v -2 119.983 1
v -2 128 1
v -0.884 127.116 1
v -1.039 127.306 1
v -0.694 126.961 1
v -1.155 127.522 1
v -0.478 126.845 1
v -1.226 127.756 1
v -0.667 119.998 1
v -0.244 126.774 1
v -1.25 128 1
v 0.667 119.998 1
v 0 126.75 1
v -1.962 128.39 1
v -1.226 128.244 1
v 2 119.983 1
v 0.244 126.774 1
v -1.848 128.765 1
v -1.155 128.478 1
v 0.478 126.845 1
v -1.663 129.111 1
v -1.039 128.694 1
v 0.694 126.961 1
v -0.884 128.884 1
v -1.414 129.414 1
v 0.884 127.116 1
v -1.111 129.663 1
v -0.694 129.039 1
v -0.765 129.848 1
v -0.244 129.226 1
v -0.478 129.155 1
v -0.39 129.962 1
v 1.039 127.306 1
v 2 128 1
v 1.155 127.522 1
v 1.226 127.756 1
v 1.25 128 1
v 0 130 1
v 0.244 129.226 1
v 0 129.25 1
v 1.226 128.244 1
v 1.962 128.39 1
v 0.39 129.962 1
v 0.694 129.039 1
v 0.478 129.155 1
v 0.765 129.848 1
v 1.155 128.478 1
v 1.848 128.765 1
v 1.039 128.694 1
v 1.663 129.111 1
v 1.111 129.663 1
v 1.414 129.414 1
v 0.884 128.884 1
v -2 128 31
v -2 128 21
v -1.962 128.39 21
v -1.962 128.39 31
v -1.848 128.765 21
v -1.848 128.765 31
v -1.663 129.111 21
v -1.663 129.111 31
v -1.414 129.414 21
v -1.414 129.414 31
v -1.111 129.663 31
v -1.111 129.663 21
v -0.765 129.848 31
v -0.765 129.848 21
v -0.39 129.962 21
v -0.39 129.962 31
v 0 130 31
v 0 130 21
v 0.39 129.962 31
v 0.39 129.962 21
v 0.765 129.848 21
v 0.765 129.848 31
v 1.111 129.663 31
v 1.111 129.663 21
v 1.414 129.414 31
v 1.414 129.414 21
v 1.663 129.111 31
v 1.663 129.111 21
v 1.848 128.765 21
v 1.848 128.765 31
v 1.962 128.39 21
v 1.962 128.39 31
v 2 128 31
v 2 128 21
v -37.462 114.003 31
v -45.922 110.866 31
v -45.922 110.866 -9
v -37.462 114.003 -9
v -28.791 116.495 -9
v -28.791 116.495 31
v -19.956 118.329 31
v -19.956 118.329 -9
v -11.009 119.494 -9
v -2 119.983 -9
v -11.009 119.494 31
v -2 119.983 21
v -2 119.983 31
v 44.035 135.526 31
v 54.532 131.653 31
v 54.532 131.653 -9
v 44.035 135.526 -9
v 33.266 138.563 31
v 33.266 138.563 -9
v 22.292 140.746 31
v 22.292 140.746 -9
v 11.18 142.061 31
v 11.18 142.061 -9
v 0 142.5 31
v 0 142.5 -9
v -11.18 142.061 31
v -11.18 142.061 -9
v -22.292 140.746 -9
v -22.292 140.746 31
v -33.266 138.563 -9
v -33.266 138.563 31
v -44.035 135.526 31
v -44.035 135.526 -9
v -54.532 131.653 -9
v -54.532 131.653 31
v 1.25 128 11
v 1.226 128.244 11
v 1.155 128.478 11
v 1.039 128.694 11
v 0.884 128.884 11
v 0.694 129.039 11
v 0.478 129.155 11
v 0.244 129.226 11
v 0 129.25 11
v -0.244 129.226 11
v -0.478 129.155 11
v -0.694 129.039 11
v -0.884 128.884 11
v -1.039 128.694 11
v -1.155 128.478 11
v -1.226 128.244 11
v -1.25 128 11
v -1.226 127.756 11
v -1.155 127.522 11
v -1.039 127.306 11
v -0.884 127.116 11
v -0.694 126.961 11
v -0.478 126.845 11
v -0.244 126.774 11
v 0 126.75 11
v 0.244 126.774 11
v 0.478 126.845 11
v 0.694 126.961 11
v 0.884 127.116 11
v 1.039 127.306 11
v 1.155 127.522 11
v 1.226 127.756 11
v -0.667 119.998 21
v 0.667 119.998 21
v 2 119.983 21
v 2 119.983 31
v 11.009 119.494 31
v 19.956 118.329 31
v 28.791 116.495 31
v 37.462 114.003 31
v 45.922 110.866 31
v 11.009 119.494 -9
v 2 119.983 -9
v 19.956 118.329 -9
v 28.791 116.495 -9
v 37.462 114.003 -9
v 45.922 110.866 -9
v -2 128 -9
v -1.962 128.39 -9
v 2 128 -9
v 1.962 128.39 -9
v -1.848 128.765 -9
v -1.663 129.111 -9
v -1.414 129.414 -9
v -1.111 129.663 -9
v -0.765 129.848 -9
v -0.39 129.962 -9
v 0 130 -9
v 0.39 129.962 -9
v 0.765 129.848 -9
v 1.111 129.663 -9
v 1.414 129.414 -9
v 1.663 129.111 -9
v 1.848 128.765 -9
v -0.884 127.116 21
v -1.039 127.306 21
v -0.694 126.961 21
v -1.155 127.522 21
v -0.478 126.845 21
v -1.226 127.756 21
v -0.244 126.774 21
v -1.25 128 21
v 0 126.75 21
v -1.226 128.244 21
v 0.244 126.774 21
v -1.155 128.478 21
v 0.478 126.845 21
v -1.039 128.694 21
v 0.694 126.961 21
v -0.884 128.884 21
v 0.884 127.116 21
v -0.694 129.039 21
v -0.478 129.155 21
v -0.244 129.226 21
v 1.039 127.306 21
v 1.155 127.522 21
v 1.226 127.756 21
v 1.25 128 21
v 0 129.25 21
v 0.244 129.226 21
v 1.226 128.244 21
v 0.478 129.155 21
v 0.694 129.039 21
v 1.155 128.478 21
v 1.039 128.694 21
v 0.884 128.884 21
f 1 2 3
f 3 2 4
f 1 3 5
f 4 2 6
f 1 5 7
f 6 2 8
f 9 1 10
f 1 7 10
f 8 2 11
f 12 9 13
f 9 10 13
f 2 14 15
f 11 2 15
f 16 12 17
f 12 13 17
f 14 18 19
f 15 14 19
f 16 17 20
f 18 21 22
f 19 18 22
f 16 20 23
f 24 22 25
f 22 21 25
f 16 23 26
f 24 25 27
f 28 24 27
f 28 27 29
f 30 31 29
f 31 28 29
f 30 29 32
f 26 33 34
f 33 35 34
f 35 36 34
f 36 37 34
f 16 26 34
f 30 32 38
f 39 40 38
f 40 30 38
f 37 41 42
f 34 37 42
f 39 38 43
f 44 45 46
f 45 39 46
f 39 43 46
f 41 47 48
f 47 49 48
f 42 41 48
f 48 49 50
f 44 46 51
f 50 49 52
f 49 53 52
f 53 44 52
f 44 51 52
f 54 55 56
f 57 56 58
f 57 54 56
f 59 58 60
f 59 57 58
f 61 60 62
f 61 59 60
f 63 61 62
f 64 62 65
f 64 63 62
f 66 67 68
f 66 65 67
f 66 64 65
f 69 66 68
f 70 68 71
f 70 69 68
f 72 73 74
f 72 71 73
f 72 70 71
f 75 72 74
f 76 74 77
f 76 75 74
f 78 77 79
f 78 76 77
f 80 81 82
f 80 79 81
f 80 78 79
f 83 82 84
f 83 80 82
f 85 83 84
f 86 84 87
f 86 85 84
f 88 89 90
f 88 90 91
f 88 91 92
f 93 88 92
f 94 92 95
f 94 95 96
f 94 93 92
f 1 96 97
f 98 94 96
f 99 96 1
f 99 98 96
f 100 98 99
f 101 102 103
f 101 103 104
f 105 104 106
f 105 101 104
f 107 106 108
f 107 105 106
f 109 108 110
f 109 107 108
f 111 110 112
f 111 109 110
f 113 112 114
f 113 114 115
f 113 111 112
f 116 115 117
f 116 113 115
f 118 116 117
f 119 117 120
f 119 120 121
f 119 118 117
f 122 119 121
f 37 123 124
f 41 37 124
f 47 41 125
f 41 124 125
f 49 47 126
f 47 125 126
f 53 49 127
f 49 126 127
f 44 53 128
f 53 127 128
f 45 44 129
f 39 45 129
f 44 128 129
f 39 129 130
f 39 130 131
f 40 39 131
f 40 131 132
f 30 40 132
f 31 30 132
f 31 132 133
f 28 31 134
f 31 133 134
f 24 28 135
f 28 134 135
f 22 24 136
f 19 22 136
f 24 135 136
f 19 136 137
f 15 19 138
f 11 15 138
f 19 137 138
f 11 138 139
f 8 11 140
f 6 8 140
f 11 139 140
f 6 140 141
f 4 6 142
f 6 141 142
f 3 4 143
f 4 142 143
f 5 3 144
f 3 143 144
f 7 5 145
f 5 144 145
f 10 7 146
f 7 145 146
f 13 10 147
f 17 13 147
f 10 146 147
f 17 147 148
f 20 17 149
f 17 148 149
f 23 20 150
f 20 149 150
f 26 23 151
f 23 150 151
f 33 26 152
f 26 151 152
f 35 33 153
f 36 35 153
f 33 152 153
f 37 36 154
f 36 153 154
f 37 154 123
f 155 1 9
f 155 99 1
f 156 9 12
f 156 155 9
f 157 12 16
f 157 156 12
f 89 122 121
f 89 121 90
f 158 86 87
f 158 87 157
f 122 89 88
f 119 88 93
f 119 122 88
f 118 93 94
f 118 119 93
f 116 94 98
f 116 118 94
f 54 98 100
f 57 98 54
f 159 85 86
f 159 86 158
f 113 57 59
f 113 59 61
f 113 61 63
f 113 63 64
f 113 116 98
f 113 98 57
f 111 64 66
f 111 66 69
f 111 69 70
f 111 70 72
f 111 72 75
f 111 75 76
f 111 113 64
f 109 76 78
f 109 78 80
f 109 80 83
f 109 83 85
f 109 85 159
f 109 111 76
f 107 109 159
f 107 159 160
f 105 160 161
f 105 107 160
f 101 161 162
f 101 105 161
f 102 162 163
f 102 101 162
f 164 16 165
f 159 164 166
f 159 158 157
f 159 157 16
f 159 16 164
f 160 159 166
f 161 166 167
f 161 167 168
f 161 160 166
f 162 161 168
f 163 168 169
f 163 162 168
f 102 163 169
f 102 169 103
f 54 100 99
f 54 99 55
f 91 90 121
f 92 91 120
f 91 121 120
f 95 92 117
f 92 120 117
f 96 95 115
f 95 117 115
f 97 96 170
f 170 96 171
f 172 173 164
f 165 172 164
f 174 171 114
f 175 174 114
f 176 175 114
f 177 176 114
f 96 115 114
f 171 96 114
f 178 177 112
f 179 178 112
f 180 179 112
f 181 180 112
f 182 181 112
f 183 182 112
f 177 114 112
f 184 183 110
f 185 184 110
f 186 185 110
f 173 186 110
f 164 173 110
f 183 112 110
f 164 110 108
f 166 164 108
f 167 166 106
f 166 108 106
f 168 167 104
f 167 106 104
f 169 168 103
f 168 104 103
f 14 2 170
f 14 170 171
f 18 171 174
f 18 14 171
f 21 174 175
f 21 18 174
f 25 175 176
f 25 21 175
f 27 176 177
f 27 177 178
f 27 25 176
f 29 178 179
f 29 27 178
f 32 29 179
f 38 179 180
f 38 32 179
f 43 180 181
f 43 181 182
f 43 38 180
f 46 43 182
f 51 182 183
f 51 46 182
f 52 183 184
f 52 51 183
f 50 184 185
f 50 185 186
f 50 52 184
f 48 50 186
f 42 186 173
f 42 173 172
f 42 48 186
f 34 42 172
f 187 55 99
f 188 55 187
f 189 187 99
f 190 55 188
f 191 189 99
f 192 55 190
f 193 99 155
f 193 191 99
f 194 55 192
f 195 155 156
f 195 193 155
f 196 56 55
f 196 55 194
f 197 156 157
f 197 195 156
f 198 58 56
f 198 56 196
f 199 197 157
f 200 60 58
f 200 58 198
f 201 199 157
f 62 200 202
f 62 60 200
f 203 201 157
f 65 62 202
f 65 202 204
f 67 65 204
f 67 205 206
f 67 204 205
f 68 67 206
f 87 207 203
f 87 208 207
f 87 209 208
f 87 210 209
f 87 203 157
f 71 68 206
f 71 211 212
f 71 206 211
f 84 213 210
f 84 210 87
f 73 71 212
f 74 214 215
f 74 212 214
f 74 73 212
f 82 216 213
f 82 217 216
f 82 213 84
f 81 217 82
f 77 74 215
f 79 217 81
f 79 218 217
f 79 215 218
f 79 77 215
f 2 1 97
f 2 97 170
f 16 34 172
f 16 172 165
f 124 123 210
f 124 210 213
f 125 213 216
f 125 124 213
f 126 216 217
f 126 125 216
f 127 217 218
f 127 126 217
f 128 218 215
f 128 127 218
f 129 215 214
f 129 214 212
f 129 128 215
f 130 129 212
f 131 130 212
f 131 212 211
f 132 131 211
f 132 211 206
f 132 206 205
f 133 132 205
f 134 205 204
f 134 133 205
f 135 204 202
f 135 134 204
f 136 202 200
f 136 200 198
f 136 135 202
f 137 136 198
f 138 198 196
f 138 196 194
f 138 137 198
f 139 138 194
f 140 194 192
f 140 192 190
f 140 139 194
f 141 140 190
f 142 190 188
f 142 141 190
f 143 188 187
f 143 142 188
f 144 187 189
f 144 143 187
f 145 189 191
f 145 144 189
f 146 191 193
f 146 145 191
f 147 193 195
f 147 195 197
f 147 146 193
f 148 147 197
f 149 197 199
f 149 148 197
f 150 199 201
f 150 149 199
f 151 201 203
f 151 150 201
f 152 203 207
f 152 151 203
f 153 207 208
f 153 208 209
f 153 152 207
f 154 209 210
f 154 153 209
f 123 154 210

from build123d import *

# Parameters (mm, degrees)
BOSS_EXTRUDE3_DEPTH      = 20
BOSS_EXTRUDE3_DEPTH_BACK = 20
BOSS_EXTRUDE5_DEPTH      = 10
BOSS_EXTRUDE5_DEPTH_BACK = 10
SKETCH2_8_R              = 1.25


with BuildPart() as part:
    # Sketch2 → Boss-Extrude3 (new, two sides: drawn at the far end of the back side and taken through both)
    with BuildSketch(Plane.XY.offset(11).offset(-BOSS_EXTRUDE3_DEPTH_BACK)):
        with BuildLine():
            ThreePointArc((2, 119.983332176), (24.390845035, 117.495049591), (45.922011884, 110.865543901))
            Line((45.922011884, 110.865543901), (54.532389112, 131.652833383))
            ThreePointArc((54.532389112, 131.652833383), (0, 142.5), (-54.532389112, 131.652833383))
            Line((-54.532389112, 131.652833383), (-45.922011884, 110.865543901))
            ThreePointArc((-45.922011884, 110.865543901), (-24.390845035, 117.495049591), (-2, 119.983332176))
            Line((-2, 119.983332176), (-2, 128))
            ThreePointArc((-2, 128), (0, 130), (2, 128))
            Line((2, 128), (2, 119.983332176))
        make_face()
    extrude(amount=BOSS_EXTRUDE3_DEPTH + BOSS_EXTRUDE3_DEPTH_BACK)

    # Sketch2<8> → Boss-Extrude5 (add, two sides: drawn at the far end of the back side and taken through both)
    with BuildSketch(Plane.XY.offset(11).offset(-BOSS_EXTRUDE5_DEPTH_BACK)):
        with BuildLine():
            ThreePointArc((-2, 119.983332176), (0, 120), (2, 119.983332176))
            Line((2, 119.983332176), (2, 128))
            ThreePointArc((2, 128), (0, 130), (-2, 128))
            Line((-2, 128), (-2, 119.983332176))
        make_face()
        with Locations((0, 128)):
            Circle(SKETCH2_8_R, mode=Mode.SUBTRACT)
    extrude(amount=BOSS_EXTRUDE5_DEPTH + BOSS_EXTRUDE5_DEPTH_BACK)


solid = part.part
